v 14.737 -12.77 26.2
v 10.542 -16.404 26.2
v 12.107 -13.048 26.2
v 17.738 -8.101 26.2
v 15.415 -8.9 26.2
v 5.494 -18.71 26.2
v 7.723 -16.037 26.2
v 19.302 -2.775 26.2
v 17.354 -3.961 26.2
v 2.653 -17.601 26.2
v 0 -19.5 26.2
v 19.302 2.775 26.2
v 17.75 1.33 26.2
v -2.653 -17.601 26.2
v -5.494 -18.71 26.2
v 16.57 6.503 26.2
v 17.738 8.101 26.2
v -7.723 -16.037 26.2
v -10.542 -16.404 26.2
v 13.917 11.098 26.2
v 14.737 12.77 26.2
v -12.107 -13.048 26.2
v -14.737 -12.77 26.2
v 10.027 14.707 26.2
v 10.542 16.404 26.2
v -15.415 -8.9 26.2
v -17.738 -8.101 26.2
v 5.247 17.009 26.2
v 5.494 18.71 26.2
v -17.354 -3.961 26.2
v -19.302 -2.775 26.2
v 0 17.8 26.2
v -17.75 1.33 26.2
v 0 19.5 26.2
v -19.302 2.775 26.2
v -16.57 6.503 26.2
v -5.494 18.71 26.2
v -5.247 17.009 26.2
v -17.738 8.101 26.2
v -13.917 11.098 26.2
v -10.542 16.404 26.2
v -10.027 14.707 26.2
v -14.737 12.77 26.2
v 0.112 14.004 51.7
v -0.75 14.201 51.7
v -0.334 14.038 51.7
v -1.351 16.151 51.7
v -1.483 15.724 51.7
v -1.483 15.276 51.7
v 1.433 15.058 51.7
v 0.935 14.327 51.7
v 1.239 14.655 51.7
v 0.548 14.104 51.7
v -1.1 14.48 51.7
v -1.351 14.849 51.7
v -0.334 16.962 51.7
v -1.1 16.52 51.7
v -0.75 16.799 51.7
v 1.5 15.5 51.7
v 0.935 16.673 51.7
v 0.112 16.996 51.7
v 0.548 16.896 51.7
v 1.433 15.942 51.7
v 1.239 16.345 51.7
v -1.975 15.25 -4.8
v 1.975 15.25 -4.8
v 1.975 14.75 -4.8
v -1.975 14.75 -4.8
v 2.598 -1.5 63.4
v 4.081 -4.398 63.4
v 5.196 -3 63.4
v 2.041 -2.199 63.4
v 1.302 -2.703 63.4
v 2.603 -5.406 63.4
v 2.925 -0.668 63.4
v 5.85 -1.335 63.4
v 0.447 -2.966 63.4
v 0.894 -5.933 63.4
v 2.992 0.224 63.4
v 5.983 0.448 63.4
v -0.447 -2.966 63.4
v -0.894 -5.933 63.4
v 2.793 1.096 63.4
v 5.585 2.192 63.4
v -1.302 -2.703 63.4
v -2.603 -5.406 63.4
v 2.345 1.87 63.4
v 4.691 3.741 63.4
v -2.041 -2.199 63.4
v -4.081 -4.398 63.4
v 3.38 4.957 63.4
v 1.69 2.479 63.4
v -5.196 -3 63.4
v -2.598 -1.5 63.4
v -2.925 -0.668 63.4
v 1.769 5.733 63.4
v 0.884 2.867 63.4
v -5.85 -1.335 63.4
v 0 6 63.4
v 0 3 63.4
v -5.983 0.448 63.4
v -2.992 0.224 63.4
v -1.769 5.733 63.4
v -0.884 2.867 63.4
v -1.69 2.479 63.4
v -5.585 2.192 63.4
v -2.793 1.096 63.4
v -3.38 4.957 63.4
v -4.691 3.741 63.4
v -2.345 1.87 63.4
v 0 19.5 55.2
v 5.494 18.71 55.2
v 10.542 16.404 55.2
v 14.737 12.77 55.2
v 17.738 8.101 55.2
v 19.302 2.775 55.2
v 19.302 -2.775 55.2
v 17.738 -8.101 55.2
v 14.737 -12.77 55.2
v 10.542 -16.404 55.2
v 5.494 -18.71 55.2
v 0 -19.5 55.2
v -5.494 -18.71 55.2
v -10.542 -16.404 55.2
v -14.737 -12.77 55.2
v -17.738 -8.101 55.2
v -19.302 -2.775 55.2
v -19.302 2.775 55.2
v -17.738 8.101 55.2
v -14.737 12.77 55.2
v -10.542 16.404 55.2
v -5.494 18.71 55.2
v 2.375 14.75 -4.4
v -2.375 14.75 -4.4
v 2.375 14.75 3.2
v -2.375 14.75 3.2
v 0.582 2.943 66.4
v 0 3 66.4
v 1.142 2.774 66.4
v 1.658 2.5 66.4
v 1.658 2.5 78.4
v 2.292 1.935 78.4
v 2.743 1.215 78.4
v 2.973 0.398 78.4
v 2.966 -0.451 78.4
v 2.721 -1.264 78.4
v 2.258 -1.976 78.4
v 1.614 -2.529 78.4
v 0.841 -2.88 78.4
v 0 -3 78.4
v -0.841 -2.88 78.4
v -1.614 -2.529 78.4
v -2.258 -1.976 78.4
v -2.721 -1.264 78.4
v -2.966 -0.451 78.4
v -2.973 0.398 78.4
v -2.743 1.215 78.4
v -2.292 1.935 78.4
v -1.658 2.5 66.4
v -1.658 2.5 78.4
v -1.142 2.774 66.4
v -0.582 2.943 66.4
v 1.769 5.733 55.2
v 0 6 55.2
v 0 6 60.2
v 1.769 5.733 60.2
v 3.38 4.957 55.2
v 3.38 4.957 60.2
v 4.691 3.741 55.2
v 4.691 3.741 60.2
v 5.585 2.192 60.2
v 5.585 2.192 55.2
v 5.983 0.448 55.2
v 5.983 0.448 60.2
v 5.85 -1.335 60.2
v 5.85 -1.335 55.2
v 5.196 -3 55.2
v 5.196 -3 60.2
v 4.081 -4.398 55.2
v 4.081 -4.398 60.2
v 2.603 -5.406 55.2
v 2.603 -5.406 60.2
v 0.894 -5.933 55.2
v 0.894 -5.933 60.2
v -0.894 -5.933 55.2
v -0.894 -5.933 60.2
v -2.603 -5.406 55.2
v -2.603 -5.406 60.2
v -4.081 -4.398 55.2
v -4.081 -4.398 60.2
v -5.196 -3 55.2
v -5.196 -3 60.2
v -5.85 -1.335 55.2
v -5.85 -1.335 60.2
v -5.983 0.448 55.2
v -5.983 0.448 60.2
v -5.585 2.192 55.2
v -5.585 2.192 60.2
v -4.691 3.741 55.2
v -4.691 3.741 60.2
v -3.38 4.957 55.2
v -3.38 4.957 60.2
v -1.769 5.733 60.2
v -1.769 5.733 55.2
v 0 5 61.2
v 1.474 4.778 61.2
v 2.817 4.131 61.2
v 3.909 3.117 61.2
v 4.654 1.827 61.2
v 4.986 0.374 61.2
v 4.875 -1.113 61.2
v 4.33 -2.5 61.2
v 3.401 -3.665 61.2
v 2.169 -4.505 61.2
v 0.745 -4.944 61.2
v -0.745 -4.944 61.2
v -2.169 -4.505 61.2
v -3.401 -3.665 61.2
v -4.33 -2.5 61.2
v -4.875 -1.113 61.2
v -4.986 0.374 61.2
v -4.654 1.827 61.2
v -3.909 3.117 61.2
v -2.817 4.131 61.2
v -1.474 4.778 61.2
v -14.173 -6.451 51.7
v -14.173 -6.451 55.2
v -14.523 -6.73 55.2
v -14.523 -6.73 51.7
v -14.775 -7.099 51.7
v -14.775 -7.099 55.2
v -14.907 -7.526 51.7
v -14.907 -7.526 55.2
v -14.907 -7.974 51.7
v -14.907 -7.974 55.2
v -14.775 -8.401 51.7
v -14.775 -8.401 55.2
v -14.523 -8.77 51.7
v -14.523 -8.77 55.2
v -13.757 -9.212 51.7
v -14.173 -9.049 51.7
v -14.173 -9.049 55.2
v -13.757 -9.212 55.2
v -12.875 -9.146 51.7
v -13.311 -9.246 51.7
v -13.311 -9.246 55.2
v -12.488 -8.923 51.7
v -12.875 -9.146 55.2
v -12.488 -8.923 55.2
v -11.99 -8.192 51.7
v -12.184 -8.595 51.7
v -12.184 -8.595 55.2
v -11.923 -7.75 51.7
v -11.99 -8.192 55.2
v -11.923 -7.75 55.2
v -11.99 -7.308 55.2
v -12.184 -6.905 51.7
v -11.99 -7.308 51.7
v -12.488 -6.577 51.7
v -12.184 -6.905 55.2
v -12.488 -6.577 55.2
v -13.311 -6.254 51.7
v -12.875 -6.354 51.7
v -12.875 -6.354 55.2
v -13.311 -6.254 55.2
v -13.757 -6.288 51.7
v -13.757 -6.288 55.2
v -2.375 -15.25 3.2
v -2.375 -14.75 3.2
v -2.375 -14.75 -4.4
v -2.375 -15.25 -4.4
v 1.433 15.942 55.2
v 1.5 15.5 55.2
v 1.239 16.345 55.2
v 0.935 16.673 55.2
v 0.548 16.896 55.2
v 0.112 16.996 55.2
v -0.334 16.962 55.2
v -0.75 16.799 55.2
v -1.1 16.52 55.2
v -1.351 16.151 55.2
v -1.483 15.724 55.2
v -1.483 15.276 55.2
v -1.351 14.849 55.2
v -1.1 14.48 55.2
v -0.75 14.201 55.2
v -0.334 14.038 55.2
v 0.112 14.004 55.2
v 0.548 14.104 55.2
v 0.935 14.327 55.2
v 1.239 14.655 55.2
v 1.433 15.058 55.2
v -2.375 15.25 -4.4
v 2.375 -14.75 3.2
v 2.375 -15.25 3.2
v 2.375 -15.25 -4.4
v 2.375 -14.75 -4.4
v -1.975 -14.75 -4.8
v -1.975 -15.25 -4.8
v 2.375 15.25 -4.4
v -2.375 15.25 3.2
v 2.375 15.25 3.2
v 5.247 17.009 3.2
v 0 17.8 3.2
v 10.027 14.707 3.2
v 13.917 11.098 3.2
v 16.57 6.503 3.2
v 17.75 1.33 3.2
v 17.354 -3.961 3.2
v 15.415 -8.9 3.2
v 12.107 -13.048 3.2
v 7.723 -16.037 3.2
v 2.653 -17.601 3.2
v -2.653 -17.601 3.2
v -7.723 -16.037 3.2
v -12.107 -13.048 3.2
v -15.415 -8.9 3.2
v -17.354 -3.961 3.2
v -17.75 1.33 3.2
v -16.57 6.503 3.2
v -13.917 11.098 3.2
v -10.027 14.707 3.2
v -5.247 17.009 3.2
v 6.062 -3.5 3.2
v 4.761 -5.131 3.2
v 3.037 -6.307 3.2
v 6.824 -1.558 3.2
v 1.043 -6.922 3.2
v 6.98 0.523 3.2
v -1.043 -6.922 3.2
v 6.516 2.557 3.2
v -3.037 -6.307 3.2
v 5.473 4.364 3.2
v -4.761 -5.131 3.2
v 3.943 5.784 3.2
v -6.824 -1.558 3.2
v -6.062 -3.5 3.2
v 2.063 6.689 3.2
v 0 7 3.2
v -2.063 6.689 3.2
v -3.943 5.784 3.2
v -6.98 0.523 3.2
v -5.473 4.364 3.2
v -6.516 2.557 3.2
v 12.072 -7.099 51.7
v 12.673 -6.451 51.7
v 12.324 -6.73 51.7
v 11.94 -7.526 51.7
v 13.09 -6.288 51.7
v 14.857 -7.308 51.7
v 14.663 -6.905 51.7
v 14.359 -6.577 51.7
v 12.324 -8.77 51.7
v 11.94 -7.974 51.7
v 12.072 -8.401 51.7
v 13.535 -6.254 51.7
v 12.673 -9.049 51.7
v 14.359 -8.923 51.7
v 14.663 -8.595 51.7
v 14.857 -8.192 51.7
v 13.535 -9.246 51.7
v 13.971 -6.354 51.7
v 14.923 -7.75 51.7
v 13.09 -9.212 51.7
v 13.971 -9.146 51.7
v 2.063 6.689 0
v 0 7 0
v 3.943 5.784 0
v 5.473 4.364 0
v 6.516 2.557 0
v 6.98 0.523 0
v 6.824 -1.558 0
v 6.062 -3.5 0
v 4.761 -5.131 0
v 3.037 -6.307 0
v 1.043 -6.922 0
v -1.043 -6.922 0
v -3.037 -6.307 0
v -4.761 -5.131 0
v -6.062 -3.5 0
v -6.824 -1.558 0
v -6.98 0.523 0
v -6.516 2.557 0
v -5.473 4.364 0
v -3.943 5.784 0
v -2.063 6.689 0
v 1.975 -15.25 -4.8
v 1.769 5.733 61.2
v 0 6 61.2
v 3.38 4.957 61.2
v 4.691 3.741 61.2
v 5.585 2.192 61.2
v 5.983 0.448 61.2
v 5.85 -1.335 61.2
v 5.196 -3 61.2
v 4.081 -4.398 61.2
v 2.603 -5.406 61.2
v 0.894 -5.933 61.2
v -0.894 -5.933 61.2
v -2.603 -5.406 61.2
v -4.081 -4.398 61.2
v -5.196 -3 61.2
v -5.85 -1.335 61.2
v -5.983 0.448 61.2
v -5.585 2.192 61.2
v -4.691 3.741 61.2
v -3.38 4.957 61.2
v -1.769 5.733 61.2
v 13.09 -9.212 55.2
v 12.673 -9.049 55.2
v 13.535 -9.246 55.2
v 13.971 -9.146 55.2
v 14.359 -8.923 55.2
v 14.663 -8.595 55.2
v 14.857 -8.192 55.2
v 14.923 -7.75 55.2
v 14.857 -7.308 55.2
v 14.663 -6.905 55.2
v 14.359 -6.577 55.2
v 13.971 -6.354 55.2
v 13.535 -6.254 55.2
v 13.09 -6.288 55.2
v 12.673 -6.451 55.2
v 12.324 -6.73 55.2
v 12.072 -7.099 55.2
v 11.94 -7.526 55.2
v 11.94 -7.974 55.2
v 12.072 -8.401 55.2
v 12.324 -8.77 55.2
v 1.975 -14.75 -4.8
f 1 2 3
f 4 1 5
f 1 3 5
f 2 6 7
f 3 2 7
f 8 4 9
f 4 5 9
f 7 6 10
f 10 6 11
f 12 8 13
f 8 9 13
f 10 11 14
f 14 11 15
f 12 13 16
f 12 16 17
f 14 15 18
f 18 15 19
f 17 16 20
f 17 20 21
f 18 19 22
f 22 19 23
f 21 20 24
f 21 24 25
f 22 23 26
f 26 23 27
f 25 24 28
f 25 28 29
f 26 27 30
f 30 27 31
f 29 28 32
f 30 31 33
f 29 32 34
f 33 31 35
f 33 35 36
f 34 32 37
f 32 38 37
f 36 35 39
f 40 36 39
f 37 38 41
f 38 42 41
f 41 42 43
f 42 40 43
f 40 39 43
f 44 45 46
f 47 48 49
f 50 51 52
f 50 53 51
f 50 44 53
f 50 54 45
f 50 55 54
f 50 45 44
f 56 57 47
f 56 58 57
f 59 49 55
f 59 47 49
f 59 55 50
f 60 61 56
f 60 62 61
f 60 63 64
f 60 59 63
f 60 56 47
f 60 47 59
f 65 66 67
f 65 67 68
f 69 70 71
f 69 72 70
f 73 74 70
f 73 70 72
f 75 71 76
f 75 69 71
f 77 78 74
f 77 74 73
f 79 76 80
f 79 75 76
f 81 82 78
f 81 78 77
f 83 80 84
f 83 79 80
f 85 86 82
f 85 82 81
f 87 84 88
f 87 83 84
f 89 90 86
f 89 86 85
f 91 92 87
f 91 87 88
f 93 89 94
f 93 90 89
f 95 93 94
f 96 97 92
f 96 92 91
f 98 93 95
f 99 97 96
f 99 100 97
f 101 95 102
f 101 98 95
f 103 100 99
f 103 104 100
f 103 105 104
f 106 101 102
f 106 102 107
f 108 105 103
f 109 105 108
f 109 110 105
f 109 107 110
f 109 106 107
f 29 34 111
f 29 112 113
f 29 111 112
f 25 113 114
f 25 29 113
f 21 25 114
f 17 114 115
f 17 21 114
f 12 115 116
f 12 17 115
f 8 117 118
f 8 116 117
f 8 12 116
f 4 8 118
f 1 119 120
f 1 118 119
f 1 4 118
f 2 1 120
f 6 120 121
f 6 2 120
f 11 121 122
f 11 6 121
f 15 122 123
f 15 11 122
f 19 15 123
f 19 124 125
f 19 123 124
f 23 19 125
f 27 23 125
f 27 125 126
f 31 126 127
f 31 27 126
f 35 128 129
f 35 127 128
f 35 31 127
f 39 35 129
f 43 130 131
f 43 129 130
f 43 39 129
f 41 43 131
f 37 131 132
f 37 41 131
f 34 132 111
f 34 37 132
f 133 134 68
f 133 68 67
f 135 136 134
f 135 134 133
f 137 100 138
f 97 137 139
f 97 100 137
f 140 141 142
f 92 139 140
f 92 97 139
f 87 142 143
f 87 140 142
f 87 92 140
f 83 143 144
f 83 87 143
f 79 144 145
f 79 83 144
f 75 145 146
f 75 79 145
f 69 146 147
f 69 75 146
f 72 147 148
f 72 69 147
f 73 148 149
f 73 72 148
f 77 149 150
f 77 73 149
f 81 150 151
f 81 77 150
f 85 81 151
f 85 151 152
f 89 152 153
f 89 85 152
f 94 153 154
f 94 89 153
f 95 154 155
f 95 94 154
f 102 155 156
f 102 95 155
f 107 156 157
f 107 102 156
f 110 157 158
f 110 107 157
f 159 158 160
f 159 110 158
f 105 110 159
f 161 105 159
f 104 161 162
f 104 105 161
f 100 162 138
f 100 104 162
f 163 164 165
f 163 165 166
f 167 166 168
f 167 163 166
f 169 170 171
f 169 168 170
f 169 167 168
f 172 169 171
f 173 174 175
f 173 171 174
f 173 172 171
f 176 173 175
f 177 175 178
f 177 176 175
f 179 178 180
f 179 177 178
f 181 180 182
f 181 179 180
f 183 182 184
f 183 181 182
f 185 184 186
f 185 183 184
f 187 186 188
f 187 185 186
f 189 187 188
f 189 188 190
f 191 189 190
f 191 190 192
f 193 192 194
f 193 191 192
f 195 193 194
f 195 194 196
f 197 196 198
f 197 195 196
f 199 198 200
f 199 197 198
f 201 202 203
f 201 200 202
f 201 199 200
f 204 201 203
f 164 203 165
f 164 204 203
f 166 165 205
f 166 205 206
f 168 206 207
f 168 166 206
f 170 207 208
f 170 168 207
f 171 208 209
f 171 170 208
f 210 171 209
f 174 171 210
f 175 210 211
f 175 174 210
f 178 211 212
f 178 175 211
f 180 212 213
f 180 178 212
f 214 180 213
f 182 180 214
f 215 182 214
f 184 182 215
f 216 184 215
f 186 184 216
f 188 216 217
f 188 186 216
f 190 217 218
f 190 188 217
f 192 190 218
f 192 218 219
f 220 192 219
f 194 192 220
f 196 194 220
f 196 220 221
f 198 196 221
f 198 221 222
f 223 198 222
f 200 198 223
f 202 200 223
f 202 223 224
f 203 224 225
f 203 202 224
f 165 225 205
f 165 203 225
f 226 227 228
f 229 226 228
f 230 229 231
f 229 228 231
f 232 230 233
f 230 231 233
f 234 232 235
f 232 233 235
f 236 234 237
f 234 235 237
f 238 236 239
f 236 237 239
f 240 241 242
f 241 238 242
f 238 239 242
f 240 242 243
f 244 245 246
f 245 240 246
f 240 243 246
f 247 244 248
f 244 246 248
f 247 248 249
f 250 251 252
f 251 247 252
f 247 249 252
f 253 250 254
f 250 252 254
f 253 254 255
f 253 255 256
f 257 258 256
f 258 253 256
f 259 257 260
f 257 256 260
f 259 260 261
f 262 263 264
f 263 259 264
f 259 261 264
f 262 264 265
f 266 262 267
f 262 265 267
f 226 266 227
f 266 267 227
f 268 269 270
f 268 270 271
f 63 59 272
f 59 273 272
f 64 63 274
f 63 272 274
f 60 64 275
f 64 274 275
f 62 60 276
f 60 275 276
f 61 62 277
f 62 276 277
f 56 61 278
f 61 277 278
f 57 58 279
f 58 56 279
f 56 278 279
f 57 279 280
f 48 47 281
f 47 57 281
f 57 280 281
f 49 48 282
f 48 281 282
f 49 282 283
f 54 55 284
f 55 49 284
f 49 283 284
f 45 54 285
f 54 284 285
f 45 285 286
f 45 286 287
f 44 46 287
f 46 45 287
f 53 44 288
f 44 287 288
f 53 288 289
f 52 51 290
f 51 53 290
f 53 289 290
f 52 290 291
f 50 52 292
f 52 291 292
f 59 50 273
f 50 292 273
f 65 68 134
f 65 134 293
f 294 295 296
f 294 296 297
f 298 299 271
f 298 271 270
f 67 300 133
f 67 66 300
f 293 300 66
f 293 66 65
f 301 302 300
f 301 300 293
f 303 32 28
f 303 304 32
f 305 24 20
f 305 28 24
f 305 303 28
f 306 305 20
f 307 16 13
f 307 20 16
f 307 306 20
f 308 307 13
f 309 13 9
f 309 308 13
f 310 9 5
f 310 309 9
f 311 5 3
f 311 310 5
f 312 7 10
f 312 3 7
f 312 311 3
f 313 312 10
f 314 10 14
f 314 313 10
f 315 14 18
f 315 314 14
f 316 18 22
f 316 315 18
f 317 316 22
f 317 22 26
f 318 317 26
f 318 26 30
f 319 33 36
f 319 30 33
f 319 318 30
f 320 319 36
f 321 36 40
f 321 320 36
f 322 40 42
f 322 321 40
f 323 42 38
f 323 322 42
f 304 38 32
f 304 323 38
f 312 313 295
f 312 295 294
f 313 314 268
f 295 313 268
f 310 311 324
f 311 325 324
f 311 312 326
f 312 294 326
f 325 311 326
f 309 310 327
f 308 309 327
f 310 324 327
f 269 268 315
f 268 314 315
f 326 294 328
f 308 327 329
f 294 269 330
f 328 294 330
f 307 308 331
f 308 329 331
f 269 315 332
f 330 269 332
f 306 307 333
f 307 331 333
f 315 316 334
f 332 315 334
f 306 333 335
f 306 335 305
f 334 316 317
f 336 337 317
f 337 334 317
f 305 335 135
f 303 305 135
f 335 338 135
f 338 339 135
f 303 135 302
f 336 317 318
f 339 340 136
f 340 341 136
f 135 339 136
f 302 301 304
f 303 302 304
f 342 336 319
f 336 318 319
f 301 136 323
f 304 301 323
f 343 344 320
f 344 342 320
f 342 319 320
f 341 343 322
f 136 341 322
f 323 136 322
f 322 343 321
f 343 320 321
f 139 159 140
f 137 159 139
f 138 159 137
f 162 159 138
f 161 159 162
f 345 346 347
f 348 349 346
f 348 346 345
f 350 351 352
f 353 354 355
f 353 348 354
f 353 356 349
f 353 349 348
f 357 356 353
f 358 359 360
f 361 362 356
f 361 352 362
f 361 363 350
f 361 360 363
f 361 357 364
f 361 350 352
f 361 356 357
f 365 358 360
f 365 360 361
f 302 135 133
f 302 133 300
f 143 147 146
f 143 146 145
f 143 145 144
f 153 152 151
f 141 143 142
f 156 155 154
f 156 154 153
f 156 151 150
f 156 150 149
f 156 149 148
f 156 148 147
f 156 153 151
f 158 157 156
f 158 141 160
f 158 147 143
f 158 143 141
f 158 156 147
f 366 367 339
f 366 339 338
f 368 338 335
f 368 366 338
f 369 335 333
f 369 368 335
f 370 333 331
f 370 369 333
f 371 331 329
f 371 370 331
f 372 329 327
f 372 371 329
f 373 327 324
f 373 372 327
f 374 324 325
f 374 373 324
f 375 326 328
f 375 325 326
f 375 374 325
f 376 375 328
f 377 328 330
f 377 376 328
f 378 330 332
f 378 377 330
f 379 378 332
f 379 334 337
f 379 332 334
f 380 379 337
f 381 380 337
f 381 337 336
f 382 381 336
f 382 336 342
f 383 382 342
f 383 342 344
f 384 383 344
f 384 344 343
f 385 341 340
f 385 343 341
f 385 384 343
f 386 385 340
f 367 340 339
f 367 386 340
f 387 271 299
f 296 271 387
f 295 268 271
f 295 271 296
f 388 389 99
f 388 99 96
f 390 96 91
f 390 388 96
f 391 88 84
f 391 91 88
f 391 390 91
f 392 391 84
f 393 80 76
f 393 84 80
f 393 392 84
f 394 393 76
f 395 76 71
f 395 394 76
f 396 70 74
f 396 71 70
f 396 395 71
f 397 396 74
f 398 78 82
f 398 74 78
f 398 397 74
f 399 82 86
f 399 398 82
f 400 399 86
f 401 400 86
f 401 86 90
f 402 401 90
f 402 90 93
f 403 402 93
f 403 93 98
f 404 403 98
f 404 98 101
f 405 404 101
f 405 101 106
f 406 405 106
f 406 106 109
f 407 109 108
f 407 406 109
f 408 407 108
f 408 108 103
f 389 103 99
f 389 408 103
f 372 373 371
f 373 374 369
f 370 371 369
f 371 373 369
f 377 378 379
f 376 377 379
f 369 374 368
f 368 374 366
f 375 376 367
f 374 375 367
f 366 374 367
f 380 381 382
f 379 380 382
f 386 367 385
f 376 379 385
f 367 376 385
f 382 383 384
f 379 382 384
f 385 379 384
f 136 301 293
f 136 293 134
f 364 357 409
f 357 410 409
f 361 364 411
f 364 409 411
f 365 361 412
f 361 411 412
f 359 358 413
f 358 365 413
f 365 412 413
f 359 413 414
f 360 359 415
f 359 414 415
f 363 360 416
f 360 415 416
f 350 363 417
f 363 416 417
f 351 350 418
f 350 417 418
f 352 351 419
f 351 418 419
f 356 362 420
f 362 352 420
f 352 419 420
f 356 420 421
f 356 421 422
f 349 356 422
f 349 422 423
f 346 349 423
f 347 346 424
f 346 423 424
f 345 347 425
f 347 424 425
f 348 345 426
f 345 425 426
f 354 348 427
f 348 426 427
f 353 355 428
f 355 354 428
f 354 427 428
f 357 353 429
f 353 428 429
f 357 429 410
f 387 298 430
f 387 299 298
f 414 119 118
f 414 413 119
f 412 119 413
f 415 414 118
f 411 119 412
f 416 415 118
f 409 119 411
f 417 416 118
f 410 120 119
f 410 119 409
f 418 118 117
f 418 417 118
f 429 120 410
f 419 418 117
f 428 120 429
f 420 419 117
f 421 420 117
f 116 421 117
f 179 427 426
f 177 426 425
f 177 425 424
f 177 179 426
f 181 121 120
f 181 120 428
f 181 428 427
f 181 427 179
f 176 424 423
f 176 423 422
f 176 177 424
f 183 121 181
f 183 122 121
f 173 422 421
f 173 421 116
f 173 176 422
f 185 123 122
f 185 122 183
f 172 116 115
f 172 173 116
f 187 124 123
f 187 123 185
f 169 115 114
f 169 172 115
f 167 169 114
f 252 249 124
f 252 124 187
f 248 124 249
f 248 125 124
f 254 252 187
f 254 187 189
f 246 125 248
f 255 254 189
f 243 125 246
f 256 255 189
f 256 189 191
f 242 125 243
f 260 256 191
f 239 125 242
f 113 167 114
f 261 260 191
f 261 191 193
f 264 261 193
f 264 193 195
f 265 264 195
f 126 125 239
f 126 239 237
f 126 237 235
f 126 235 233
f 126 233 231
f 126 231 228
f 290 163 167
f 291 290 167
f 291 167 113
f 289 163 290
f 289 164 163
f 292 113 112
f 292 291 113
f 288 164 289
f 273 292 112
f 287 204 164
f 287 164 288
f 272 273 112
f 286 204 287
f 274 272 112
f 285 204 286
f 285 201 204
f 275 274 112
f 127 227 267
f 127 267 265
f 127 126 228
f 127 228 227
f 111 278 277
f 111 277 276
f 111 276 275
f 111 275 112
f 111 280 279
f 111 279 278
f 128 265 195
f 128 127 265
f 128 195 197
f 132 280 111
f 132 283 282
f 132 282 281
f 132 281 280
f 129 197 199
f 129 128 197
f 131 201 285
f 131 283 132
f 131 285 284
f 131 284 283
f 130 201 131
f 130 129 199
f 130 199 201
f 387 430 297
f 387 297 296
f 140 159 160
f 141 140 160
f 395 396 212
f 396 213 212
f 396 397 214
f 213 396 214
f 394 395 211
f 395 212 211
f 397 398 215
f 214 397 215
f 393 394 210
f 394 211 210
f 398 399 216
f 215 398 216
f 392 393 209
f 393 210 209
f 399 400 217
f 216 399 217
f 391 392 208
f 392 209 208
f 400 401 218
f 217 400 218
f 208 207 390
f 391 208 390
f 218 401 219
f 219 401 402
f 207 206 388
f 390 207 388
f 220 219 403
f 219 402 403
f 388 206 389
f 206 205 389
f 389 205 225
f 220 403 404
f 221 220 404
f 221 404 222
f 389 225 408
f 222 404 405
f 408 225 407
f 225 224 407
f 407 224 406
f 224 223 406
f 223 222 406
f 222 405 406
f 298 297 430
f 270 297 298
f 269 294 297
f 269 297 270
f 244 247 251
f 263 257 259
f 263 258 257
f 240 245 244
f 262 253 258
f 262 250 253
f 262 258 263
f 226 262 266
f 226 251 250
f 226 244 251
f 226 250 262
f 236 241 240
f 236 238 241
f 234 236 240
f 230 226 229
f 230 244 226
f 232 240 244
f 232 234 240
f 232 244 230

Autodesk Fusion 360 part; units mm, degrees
sketch "Sketch2" plane through (0, 0, 0) normal (1, 0, 0) x (0, 0, -1)
  line L0 (0, 0) -> (-3.2, 0)
  line L1 (-3.2, 0) -> (-3.2, 7)
  line L2 (-3.2, 7) -> (0, 7)
  line L3 (0, 7) -> (0, 0)
  line L4 (-3.2, 0) -> (-26.2, 0)
  line L5 (-26.2, 0) -> (-26.2, 17.8)
  line L6 (-26.2, 17.8) -> (-3.2, 17.8)
  line L7 (-3.2, 17.8) -> (-3.2, 0)
  line L8 (-26.2, 0) -> (-55.2, 0)
  line L9 (-55.2, 0) -> (-55.2, 19.5)
  line L10 (-55.2, 19.5) -> (-26.2, 19.5)
  line L11 (-26.2, 19.5) -> (-26.2, 0)
  line L12 (-55.2, 0) -> (-61.2, 0)
  line L13 (-61.2, 0) -> (-61.2, 6)
  line L14 (-60.2, 6) -> (-55.2, 6)
  line L15 (-55.2, 6) -> (-55.2, 0)
  line L16 (-61.2, 0) -> (-63.4, 0)
  line L17 (-63.4, 0) -> (-63.4, 6)
  line L18 (-63.4, 6) -> (-61.2, 6)
  line L19 (-61.2, 5) -> (-61.2, 0)
  line L20 (-63.4, 0) -> (-78.4, 0)
  line L21 (-78.4, 0) -> (-78.4, 3)
  line L22 (-78.4, 3) -> (-63.4, 3)
  line L23 (-63.4, 3) -> (-63.4, 0)
  line L24 (-60.2, 6) -> (-61.2, 5)
  dimension "d4" = 3.2
  dimension "d6" = 52
  dimension "d7" = 29
  dimension "d8" = 6
  dimension "d9" = 2.2
  dimension "d10" = 23.2
  dimension "d11" = 7
  dimension "d12" = 17.8
  dimension "d13" = 19.5
  dimension "d14" = 6
  dimension "d15" = 6
  dimension "d16" = 3
  dimension "d17" = 1
  dimension "d18" = 1
revolve "Revolve1" add sketch "Sketch2" angle 360 about axis through (0, 0, 63.4) along (0, 0, 1)
sketch "Sketch3" plane through (0, 0, 0) normal (1, 0, 0) x (0, 0, -1)
  line L0 (-78.4, 3) -> (-66.4, 3)
  line L1 (-66.4, 3) -> (-66.4, 2.5)
  line L2 (-66.4, 2.5) -> (-78.4, 2.5)
  line L3 (-78.4, 2.5) -> (-78.4, 3)
  point P0 (-78.4, 3)
  dimension "d20" = 12
  dimension "d21" = 0.5
extrude "Extrude2" cut sketch "Sketch3" along normal through all and the other way through all
sketch "Sketch4" plane through (0, 0, 3.2) normal (0, 0, -1) x (-1, 0, 0)
  circle A0 centre (0, 0) radius 17.8
  circle A1 centre (0, 0) radius 7
  line L0 (2.375, 14.75) -> (-2.375, 14.75)
  line L1 (-2.375, 14.75) -> (-2.375, 15.25)
  line L2 (-2.375, 15.25) -> (2.375, 15.25)
  line L3 (2.375, 15.25) -> (2.375, 14.75)
  line L4 (2.375, 14.75) -> (-2.375, 15.25) construction
  line L5 (-2.375, 14.75) -> (2.375, 15.25) construction
  point P0 (0, 15)
  dimension "d24" = 4.75
  dimension "d25" = 15
  dimension "d26" = 0.5
extrude "Extrude3" add sketch "Sketch4" along normal blind 8 contours L0 L1 L2 L3
mirror "Mirror1" about plane through (0, 0, 0) normal (0, 1, 0) of "Extrude3"
sketch "Sketch5" plane through (0, 15.25, 0) normal (0, 1, 0) x (-1, 0, 0)
  line L0 (2.375, 3.2) -> (-2.375, 3.2)
  line L1 (-2.375, 3.2) -> (-2.375, -4.8)
  line L2 (-2.375, -4.8) -> (2.375, -4.8)
  line L3 (2.375, -4.8) -> (2.375, 3.2)
  circle A0 centre (0, -1.6) radius 1
  dimension "d31" = 2
  dimension "d32" = 3.2
extrude "Extrude4" cut sketch "Sketch5" along normal through all contours A0
chamfer "Chamfer1" distance 0.4 angle 45 4 edges at (-2.375, 15, -4.8) (2.375, 15, -4.8) (2.375, -15, -4.8) (-2.375, -15, -4.8)
sketch "Sketch6" plane through (0, 0, 55.2) normal (0, 0, 1) x (1, 0, 0)
  circle A0 centre (0, 0) radius 6
  circle A1 centre (0, 0) radius 19.5
  circle A2 centre (0, 15.5) radius 1.5
  arc A3 (-1.4982, 15.4274) -> (-14.1097, -6.4162) centre (0, 0) ccw
  dimension "d35" = 3
  dimension "d36" = 31
extrude "Extrude5" cut sketch "Sketch6" against normal blind 3.5 contours A2
thread "Thread1"
pattern_circular "C-Pattern1" count 3 over 360 about axis through (0, 0, 1.75) along (0, 0, 1) of "Extrude5"
equation "d18 = d17"
